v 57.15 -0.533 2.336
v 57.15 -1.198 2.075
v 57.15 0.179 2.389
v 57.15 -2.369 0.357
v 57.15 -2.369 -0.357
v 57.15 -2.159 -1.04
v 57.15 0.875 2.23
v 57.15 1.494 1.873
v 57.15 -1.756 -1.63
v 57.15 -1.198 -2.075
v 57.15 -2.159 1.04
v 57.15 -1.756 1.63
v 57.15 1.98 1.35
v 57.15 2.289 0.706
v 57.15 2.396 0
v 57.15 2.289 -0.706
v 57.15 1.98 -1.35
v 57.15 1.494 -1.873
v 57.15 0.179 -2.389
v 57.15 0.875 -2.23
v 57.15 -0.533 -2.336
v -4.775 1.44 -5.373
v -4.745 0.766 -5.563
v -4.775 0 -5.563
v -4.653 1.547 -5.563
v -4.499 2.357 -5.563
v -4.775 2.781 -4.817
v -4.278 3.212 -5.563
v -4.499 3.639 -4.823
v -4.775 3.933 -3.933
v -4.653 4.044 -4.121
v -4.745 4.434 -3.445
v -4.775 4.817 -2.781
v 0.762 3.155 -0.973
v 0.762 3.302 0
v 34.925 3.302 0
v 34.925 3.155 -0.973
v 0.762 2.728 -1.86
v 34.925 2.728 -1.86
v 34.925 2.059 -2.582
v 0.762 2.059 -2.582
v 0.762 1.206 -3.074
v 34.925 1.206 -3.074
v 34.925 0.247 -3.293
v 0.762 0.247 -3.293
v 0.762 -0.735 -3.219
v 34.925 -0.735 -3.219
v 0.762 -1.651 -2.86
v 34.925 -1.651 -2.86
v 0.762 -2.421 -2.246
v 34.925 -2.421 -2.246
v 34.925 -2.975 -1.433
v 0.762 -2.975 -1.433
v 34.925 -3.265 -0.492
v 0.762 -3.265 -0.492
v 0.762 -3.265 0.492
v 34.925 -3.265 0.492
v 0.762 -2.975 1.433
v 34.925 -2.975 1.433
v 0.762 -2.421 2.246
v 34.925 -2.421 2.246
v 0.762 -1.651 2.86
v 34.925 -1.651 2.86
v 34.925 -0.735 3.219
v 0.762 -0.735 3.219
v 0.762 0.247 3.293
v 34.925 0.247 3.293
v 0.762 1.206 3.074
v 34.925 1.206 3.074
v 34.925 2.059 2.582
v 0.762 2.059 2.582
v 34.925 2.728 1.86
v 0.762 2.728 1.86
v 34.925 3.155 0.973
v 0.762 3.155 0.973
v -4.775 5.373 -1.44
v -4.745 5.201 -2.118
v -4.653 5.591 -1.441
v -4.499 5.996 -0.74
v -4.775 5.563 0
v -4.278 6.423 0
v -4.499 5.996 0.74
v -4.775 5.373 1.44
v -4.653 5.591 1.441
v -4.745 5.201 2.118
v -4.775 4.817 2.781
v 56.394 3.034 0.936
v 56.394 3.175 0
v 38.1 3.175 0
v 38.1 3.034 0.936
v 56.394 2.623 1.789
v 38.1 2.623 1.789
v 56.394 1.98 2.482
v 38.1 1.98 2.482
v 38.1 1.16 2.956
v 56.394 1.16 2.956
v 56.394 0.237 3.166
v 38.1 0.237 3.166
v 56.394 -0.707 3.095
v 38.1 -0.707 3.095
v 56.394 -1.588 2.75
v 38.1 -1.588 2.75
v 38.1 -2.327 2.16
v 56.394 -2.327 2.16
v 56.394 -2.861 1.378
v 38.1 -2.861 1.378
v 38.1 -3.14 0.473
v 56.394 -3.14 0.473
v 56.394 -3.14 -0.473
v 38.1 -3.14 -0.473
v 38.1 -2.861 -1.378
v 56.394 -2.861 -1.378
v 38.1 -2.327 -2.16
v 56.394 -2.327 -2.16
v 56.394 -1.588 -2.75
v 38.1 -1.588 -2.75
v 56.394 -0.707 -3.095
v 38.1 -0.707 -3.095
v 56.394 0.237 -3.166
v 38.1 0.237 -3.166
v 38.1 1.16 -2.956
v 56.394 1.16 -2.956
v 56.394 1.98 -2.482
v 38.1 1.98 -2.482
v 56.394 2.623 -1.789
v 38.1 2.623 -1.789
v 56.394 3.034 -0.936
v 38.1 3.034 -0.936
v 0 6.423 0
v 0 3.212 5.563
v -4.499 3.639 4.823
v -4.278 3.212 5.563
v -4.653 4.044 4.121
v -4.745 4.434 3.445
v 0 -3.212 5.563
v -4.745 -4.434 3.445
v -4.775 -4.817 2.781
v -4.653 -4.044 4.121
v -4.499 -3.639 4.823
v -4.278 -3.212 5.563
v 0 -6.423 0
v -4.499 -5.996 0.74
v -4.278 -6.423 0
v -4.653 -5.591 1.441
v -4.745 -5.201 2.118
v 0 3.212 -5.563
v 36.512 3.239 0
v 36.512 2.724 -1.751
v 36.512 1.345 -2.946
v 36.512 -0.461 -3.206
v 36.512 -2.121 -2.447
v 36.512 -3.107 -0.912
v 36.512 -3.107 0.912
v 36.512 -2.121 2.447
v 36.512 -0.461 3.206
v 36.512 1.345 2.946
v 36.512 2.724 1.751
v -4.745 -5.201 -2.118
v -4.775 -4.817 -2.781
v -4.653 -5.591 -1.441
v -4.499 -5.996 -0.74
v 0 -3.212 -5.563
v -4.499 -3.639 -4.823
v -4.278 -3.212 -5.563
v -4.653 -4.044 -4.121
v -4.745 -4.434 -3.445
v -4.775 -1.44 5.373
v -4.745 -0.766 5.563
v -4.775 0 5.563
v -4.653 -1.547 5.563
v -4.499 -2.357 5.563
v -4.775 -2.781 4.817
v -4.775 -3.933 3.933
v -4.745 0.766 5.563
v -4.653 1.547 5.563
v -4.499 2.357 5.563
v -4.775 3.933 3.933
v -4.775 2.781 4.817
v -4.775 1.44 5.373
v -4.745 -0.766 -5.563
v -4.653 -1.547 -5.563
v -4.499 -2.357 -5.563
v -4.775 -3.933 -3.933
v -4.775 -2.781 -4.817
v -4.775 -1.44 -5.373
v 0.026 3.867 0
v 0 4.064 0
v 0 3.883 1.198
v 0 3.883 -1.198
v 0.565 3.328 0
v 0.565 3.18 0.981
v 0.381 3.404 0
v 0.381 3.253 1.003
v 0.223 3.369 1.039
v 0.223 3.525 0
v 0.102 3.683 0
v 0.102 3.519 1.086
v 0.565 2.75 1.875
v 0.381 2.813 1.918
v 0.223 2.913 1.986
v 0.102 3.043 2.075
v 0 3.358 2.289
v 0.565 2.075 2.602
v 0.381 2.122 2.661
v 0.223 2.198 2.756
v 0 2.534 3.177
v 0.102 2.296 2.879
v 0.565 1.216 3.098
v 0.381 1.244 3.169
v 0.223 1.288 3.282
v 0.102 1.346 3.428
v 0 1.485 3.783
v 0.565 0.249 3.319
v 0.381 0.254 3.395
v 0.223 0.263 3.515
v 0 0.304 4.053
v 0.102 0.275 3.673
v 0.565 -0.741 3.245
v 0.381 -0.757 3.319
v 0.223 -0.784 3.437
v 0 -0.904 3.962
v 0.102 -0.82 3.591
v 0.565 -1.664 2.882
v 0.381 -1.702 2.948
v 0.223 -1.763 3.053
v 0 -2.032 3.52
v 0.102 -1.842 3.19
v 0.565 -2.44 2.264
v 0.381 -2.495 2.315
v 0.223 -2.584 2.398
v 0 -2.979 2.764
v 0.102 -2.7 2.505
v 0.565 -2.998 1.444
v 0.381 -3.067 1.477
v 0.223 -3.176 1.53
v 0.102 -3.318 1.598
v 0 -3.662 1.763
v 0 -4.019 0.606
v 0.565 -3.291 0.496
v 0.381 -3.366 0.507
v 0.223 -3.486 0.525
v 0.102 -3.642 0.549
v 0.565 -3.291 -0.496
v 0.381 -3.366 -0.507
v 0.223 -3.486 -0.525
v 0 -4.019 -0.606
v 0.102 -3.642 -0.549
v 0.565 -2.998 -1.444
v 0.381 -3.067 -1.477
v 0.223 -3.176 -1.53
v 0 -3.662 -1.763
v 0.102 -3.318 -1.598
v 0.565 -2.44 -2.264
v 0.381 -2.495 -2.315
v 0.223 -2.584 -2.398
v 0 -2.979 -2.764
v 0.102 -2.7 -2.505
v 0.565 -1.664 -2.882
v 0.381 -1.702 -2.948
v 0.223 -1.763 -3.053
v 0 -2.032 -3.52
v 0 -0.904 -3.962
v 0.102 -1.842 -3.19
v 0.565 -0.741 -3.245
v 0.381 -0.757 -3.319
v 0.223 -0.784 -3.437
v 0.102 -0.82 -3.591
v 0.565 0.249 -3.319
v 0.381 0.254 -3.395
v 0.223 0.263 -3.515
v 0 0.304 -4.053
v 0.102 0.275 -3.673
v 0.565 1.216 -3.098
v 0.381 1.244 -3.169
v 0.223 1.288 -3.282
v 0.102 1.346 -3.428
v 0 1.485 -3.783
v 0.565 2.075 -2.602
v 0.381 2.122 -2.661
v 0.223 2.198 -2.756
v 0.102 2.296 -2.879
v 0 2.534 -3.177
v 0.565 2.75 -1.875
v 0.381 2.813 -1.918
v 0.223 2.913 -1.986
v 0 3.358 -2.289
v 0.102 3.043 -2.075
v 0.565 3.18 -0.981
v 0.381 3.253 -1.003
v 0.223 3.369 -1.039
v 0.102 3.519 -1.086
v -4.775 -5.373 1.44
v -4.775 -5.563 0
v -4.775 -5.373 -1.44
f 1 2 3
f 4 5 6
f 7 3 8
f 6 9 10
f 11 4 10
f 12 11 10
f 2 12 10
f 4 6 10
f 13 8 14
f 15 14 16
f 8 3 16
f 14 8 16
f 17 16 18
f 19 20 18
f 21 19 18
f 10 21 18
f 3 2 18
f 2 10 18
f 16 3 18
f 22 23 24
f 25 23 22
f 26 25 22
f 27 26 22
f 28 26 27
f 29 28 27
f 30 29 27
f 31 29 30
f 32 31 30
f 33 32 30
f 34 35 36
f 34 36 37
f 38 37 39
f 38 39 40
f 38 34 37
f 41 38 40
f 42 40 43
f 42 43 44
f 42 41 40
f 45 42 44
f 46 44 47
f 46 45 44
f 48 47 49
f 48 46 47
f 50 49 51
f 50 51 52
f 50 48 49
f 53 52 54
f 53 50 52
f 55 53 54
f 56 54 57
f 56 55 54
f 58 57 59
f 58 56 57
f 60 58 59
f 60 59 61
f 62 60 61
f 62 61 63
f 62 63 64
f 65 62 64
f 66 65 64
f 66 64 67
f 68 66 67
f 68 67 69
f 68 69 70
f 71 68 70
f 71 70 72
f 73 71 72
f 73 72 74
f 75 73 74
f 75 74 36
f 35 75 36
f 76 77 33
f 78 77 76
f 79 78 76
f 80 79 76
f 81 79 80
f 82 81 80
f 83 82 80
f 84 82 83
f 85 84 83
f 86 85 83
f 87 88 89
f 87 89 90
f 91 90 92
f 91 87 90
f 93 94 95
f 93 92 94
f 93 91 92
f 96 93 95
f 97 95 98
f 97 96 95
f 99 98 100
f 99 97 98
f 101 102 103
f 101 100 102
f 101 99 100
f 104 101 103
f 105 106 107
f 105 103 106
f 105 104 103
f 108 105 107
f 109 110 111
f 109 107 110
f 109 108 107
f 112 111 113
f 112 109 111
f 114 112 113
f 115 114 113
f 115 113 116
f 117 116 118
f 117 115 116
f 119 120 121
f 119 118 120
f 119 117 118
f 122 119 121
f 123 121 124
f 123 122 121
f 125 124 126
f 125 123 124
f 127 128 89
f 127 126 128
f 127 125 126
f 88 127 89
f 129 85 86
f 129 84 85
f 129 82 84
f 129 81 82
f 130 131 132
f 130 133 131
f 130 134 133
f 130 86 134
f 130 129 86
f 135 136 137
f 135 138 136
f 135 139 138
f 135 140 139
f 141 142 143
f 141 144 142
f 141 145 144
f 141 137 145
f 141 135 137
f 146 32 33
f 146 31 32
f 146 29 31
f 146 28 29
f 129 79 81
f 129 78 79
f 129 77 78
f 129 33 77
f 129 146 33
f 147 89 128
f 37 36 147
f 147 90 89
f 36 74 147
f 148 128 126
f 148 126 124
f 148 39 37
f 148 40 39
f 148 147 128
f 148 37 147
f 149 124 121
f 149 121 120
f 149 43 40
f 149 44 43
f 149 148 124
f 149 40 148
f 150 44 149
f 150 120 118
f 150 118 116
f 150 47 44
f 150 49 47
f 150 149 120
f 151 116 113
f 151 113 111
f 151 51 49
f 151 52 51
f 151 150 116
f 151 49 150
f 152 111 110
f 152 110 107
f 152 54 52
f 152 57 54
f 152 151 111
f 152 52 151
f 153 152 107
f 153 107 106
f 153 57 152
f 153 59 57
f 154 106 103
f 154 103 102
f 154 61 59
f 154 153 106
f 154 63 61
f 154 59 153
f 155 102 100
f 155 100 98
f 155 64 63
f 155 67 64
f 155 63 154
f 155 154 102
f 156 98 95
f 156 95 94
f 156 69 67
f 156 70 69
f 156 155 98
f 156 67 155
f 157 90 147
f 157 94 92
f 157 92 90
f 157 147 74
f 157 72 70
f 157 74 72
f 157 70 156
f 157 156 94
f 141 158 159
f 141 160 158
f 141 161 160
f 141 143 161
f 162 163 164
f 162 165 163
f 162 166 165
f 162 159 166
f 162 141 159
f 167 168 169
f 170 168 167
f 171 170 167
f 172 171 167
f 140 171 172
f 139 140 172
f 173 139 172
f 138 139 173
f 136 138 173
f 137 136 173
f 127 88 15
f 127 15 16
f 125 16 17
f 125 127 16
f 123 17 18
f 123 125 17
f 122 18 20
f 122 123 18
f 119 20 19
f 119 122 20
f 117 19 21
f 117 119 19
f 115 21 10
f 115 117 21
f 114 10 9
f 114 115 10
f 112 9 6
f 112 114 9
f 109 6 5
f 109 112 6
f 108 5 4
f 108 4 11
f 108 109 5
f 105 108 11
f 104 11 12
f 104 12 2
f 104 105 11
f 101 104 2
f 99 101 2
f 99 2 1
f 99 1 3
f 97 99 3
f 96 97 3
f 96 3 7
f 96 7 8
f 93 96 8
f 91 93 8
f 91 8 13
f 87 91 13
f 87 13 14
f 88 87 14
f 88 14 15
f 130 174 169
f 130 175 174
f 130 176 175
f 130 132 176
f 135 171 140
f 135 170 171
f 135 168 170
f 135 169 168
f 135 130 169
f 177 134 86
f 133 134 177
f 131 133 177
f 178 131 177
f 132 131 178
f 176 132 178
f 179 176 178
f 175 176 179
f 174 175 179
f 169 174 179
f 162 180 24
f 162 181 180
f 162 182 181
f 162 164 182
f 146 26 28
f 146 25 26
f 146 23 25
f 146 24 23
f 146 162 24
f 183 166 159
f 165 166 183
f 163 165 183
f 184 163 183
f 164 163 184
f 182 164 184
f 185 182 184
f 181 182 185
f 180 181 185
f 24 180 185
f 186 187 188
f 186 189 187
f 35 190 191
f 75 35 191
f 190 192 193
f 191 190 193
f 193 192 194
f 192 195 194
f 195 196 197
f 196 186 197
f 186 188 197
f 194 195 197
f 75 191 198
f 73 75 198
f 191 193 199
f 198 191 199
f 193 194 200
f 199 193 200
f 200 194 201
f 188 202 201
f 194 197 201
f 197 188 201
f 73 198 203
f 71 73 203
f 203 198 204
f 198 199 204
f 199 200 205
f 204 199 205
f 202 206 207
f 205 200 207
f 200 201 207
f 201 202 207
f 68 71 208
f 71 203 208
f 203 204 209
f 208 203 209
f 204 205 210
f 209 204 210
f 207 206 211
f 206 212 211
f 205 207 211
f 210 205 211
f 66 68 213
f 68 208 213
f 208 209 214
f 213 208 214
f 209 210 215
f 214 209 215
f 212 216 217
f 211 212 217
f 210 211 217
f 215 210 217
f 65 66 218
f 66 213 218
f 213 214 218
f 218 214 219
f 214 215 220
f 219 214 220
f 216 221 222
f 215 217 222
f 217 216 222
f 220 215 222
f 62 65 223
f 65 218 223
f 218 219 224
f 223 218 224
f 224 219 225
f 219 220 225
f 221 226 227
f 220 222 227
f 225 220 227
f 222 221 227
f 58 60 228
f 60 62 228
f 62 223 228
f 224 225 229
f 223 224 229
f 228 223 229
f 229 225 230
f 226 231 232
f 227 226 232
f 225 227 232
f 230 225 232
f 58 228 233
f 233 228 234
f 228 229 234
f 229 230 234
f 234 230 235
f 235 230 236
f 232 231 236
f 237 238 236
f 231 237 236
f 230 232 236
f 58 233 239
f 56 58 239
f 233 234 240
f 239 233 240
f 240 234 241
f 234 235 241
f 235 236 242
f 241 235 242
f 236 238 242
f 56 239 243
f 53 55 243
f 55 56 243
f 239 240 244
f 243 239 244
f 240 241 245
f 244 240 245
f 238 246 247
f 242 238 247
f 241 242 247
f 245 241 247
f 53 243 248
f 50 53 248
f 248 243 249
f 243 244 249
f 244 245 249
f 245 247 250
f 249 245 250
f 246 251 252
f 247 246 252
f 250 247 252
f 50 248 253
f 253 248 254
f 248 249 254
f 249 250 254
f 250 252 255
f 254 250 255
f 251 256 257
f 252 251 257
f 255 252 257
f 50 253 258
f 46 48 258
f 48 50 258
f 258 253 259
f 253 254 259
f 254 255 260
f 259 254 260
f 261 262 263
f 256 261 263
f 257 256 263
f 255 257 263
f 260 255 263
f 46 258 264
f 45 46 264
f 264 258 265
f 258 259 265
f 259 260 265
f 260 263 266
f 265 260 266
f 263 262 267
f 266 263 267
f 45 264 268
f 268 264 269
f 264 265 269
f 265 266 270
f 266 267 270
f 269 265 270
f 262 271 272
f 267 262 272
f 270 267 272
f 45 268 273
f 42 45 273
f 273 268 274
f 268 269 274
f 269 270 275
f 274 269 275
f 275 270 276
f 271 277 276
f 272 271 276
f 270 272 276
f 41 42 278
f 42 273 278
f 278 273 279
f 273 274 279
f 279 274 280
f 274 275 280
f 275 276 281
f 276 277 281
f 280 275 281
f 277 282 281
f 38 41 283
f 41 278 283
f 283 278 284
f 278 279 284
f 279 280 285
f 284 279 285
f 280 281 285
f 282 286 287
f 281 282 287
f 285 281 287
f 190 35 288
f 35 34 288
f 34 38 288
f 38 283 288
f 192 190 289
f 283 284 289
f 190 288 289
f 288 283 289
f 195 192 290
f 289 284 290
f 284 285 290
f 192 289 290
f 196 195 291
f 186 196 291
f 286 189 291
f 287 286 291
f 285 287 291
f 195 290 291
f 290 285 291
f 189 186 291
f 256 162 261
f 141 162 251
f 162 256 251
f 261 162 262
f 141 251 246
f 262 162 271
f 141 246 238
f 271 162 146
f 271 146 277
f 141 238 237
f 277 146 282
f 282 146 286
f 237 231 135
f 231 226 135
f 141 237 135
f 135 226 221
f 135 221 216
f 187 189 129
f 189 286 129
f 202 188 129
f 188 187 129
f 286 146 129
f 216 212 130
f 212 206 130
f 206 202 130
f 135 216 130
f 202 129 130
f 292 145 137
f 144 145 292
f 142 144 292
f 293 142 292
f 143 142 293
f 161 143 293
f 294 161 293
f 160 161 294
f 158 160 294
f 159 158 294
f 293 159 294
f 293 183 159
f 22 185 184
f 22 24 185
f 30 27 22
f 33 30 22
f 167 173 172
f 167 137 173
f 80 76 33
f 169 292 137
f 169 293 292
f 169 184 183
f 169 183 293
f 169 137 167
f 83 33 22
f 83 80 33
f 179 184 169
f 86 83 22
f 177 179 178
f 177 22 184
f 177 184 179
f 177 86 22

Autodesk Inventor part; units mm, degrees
ref_plane "YZ Plane" through (0, 0, 0) normal (1, 0, 0) x (0, 1, 0)
ref_plane "XZ Plane" through (0, 0, 0) normal (0, 1, 0) x (-1, 0, 0)
sketch "Sketch1" plane through (0, 0, 0) normal (0, 0, 1) x (1, 0, 0)
  line L0 (0, 5.5626) -> (0, 3.302)
  line L1 (38.1, 3.175) -> (57.15, 3.175)
  line L2 (57.15, 3.175) -> (57.15, 0)
  line L3 (57.15, 0) -> (-0.0001, 0)
  line L4 (-11.4301, 0) -> (68.58, 0) projected
  line L5 (-0.0001, 0) -> (-0.0001, 5.5626)
  line L6 (-0.0001, 5.5626) -> (0, 5.5626)
  line L7 (38.1, 3.175) -> (34.9249, 3.302)
  line L8 (34.9249, 3.302) -> (0, 3.302)
  line L9 (0, -1.1125) -> (0, 6.6751) projected
  dimension "d0" = 57.15
  dimension "d1" = 19.05
  dimension "d2" = 6.35
  dimension "d9" = 0.0001
  dimension "d10" = 11.1252
  dimension "d13" = 3.1751
  dimension "d14" = 6.604
revolve "Body" add sketch "Sketch1" angle 360 about axis through (57.15, 0, 0) along (-1, 0, 0)
sketch "Sketch2" plane through (-0.0001, 0, 0) normal (-1, 0, 0) x (0, 0, 1)
  line L0 (0, 6.4231) -> (5.5626, 3.2116)
  line L1 (5.5626, 3.2116) -> (5.5626, -3.2116)
  line L2 (5.5626, -3.2116) -> (0, -6.4231)
  line L3 (0, -6.4231) -> (-5.5626, -3.2116)
  line L4 (-5.5626, -3.2116) -> (-5.5626, 3.2116)
  line L5 (-5.5626, 3.2116) -> (0, 6.4231)
  point P0 (0, 0)
  point P1 (0, 0)
  dimension "d11" = 11.1252
extrude "Head" add sketch "Sketch2" along normal blind 4.7752
sketch "Sketch4" plane through (0, 0, 0) normal (0, 0, 1) x (1, 0, 0)
  line L0 (-4.7753, 5.5626) -> (-4.7753, 6.4231)
  line L1 (-4.7753, 6.4231) -> (-4.2785, 6.4231)
  line L2 (-4.2785, 6.4231) -> (-4.7753, 5.5626)
  line L3 (-5.7303, 0) -> (0.9549, 0) projected
  line L4 (-0.0001, 6.4231) -> (-4.7753, 6.4231) projected
  line L5 (-4.7753, 3.2116) -> (-4.7753, 6.4231) projected
  dimension "d5" = 30
  dimension "d19" = 11.1252
revolve "Chamfer1" cut sketch "Sketch4" angle 360 about axis through (-10, 0, 0) along (1, 0, 0)
thread "Thread" size "1/4-20 UNC" class "2A" standard "ANSI Unified Screw Threads" length 19.05
chamfer "Chamfer2" distance 0.7791 distance2 0.7557 1 edges at (57.15, -3.175, 0) measured on face at (57.15, -1.44, -0.4308)
ref_plane "Work Plane1" through (1.525, 0, 0) normal (0, 0, 1) x (1, 0, 0)
fillet "Fillet2" radius 0.762 1 edges at (0, -3.302, 0)
equation "\"d0\" = NLG"
equation "\"d1\" = GEL"
equation "\"d2\" = GD"
equation "\"d10\" = SD2"
equation "\"d14\" = BDM"
equation "\"d11\" = SW"
equation "\"d3\" = KOH - SD"
equation "\"d5\" = ANG1"
equation "\"d19\" = SW0"
equation "\"d63\" = R"
equation "\"d15\" = GEL"
equation "\"d6\" = -0.5 * SPD + 0.5 * GD"
equation "\"NLG\" = 57.15"
equation "\"GD\" = NND"
equation "\"BDM\" = 6.604"
equation "\"KOH\" = 4.7752"
equation "\"GEL\" = 19.05"
equation "\"SW\" = 11.1252"
equation "\"SW0\" = SW"
equation "\"SPD\" = GD1"
equation "\"SD2\" = SW"
equation "\"SD\" = 0"
equation "\"ANG1\" = 30deg"
equation "\"GAL\" = 3.175"
equation "\"GUL\" = 0.238 * GAL"
equation "\"R\" = 0.762"
equation "\"d62\" = -NLG - SD + GUL"
equation "\"GD1\" = 4.79184"
equation "\"THREADDIA\" = 6.35"
equation "\"TOA\" = 30deg"
equation "\"NND\" = 6.35"
equation "\"E0\" = 1.155 * SW"
properties part number "ANSI/ASME B18.2.1 - 1/4-20 UNC - 2.25" material "Steel, Mild"
